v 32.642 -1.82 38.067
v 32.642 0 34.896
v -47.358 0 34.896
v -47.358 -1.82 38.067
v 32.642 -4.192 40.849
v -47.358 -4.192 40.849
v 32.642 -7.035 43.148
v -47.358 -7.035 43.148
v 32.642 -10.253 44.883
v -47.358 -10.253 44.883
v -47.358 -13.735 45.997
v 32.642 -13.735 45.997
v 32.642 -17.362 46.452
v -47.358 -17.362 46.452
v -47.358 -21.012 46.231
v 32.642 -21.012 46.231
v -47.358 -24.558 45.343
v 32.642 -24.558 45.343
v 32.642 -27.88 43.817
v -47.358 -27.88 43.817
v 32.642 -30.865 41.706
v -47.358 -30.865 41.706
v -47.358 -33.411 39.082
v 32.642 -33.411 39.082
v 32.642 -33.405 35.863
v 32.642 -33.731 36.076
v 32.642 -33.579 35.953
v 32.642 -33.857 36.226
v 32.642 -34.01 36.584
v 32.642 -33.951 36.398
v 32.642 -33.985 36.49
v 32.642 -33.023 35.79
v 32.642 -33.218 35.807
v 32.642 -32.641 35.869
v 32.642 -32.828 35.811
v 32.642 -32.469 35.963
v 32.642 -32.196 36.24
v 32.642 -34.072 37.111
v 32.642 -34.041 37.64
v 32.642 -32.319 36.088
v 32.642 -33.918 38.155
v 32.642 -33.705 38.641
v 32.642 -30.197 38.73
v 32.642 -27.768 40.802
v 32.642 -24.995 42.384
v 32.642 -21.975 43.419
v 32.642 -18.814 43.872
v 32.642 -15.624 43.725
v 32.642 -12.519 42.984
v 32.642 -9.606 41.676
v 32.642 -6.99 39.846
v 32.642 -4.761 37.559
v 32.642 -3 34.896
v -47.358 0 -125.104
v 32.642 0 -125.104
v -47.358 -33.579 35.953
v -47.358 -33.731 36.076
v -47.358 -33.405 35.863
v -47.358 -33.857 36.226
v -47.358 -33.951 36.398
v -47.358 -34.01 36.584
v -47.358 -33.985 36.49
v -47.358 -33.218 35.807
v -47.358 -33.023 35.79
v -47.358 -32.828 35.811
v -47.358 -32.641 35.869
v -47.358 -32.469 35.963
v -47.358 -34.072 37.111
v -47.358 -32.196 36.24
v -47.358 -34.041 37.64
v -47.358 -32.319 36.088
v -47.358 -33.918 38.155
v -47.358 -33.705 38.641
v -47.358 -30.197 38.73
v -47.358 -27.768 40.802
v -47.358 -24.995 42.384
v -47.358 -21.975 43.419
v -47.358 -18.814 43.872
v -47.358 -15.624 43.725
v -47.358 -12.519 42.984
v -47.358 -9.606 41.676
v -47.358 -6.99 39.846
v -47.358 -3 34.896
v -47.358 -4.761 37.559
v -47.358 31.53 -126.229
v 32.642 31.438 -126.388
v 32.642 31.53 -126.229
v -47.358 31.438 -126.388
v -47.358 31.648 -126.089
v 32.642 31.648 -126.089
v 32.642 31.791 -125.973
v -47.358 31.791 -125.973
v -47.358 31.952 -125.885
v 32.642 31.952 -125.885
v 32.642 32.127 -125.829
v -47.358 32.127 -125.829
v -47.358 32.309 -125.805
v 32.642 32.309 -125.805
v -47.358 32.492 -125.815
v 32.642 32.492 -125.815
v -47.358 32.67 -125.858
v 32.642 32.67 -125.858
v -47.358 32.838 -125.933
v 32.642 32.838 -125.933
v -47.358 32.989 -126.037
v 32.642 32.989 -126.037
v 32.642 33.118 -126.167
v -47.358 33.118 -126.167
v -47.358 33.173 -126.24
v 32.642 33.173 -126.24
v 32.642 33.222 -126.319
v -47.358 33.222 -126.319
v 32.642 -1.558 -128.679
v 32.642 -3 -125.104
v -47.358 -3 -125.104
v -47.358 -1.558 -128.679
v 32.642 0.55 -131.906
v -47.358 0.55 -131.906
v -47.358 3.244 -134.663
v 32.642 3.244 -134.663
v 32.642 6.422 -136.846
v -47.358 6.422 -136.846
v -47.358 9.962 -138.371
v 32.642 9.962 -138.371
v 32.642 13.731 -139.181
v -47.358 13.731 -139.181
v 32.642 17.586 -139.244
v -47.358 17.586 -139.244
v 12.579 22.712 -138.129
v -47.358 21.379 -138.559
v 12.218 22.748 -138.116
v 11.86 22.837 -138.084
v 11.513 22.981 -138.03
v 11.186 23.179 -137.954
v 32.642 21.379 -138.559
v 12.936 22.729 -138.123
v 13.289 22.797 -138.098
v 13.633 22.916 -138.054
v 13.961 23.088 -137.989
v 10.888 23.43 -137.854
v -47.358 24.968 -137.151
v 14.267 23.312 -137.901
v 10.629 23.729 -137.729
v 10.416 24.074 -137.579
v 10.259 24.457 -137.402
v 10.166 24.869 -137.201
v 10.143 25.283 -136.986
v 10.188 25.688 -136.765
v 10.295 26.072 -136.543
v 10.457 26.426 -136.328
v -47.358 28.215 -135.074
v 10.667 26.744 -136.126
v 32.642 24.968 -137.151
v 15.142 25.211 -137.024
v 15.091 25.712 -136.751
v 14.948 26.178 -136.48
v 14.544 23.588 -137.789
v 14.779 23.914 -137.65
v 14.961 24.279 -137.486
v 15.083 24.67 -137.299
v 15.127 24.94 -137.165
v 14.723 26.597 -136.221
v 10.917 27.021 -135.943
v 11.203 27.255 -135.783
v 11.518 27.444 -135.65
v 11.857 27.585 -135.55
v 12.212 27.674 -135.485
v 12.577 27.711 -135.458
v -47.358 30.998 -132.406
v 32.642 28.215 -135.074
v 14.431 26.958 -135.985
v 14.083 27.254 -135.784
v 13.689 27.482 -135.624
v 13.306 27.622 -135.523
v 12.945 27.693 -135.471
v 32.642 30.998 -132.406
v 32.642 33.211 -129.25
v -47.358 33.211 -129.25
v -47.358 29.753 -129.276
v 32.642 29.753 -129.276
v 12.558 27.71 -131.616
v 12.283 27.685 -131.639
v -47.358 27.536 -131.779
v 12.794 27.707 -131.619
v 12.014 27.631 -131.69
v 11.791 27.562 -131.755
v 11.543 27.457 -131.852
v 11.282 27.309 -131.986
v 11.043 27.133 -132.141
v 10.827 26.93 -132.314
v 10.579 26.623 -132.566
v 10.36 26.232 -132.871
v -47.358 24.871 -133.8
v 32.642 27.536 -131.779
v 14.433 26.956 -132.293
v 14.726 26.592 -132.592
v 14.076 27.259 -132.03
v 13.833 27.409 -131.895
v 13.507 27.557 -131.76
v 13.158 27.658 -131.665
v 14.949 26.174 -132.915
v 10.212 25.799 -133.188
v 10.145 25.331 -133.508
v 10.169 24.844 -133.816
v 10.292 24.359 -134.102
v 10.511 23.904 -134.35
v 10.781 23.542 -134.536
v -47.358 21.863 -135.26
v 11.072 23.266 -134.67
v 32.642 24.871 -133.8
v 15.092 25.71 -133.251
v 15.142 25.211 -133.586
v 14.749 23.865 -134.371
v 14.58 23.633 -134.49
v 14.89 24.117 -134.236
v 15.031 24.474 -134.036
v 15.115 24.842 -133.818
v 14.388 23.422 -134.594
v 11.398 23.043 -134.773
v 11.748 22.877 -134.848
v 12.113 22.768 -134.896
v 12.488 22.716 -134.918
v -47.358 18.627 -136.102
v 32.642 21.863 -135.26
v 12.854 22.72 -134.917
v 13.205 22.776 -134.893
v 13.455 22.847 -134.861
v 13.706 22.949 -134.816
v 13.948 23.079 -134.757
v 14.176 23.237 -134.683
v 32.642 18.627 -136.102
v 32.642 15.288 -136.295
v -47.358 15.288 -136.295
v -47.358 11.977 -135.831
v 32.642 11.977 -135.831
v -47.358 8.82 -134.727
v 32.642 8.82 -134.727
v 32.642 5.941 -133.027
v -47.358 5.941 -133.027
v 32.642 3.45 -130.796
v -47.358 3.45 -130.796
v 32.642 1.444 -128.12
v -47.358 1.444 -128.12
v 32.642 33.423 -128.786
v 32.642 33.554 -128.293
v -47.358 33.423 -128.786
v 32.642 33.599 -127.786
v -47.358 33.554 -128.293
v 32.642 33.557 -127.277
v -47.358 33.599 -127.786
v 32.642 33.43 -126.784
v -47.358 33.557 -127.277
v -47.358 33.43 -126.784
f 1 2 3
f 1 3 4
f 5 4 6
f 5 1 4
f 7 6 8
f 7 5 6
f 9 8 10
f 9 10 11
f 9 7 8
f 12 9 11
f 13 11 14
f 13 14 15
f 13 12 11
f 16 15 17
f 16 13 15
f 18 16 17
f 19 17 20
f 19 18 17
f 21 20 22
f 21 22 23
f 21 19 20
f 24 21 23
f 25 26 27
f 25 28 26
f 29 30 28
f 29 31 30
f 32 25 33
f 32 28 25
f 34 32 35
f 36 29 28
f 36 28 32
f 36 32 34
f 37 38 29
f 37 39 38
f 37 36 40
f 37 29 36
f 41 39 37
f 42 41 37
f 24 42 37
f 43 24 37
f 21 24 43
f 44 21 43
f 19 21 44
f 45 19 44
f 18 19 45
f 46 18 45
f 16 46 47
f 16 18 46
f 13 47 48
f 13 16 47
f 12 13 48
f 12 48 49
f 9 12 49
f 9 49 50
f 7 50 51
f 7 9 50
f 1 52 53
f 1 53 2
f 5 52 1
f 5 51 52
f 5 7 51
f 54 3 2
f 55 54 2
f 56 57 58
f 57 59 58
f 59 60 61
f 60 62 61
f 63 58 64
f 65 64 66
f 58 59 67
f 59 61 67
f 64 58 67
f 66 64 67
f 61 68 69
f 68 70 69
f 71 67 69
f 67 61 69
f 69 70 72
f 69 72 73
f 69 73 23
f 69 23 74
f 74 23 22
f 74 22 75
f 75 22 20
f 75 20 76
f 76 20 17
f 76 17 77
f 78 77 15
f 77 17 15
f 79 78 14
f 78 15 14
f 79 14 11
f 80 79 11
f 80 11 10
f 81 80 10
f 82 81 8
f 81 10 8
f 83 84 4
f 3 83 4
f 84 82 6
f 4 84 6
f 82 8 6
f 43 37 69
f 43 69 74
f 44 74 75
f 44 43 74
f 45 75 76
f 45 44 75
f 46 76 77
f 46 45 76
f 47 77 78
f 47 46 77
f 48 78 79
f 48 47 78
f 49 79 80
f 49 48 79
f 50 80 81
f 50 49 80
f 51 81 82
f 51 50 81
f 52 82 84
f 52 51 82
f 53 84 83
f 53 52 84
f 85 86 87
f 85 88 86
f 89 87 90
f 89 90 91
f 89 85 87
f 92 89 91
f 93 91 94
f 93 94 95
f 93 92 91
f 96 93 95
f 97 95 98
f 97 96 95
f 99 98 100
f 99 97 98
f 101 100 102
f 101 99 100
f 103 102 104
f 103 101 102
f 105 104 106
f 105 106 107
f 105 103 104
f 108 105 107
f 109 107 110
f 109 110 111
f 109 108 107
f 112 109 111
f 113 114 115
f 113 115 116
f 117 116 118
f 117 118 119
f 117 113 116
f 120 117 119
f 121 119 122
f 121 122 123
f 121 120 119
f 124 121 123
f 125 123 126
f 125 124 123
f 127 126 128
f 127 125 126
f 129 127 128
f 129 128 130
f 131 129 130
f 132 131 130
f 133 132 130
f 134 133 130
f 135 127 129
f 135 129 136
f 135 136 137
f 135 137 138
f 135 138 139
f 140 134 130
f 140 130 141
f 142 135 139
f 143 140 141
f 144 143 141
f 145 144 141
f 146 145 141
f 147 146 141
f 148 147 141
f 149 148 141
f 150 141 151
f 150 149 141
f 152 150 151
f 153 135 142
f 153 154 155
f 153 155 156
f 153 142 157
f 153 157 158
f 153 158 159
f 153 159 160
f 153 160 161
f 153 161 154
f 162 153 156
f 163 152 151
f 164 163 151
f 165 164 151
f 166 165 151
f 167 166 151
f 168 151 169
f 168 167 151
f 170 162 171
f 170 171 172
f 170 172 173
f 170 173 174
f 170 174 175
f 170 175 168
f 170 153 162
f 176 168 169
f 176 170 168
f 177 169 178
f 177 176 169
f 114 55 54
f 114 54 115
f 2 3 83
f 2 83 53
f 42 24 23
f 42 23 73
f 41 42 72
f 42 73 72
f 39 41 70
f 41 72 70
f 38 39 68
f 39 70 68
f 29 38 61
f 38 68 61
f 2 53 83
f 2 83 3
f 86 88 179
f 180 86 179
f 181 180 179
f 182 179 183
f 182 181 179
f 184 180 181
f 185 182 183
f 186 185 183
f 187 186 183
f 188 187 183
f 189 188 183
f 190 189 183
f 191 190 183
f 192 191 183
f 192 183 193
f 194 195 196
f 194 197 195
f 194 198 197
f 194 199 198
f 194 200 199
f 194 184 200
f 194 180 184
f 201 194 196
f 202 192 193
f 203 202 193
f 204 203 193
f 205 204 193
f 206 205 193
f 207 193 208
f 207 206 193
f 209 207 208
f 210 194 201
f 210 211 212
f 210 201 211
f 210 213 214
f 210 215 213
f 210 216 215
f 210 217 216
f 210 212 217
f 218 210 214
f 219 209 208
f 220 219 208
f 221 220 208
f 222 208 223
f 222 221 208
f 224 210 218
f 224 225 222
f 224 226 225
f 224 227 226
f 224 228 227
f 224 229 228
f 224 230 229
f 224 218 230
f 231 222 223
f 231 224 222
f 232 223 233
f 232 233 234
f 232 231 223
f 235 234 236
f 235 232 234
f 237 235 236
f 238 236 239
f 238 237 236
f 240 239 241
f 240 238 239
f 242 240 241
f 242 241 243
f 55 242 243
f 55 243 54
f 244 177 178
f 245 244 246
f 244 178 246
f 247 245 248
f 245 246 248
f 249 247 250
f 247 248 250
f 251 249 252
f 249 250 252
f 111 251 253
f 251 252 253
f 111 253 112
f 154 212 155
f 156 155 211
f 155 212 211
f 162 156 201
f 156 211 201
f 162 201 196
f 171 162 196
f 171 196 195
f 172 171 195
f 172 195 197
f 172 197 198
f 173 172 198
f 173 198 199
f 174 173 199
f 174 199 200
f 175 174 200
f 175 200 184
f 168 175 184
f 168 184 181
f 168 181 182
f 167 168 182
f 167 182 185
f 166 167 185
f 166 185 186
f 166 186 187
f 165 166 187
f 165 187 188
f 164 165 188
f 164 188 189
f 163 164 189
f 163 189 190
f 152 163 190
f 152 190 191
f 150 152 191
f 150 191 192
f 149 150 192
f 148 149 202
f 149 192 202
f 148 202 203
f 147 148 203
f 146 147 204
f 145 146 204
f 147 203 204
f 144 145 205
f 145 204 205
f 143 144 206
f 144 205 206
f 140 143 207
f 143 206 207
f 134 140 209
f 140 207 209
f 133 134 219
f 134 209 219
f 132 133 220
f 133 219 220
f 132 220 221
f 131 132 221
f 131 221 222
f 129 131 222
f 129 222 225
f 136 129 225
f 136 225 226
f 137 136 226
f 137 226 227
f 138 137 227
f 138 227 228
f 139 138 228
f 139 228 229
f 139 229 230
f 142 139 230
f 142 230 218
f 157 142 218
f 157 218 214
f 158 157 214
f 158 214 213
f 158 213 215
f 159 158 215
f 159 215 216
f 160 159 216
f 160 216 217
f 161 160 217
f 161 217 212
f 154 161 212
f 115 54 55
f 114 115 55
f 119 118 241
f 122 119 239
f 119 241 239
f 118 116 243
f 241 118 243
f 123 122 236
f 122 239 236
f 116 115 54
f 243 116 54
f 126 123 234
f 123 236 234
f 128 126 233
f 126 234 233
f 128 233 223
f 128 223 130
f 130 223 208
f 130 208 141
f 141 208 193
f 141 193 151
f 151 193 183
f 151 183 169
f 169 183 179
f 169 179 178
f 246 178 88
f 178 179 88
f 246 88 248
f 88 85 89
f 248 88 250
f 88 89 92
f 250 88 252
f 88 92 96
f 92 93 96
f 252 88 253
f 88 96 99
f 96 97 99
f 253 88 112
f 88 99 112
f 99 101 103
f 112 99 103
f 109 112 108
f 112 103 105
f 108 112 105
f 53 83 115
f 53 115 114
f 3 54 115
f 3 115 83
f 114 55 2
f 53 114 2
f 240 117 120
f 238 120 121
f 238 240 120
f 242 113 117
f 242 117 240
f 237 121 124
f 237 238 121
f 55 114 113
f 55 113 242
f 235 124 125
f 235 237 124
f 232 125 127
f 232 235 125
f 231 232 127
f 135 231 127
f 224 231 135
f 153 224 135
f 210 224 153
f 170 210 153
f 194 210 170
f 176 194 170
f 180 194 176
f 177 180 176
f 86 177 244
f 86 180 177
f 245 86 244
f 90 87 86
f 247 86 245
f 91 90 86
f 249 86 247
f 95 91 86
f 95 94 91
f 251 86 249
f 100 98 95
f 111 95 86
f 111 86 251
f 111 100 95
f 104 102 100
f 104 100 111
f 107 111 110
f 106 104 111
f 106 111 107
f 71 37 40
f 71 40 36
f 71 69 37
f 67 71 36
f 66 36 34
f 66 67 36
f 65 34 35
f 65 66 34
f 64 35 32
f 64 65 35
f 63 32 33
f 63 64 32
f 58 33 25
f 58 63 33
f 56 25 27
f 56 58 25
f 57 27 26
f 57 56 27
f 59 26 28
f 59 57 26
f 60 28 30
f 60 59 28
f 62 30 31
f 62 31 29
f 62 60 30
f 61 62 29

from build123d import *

# Parameters (mm, degrees)
F0_W          = 80
F0_H          = 160
F1_DEPTH      = 3
F3_DEPTH      = 80
F4_T1_DEPTH   = 104.5932134922
F4_2_T1_DEPTH = 102.506788887
F5_R          = 1
F5_2_R        = 1
F6_R          = 2.5
F7_DEPTH      = 139.3101269636


# Not quite as in the source:
# - a fillet or chamfer that OpenCascade refuses, or shapes differently, is made with other operations: its cross-section is extruded or revolved along the edge and cut away or added


with BuildPart() as f1:
    # F0 (on Front) → F1 (new body)
    with BuildSketch(Plane.XZ):
        with Locations((-7.3579295626, -45.1037270249)):
            Rectangle(F0_W, F0_H)
    extrude(amount=F1_DEPTH)


with BuildPart() as f3:
    # F2 (on face) → F3 (new body)
    with BuildSketch(Plane.YZ.offset(32.6420704374)):
        with BuildLine():
            Line((-3, 34.8962729751), (0, 34.8962729751))
            ThreePointArc((0, 34.8962729751), (-17.9972580969, 46.4620537988), (-35.9945161939, 34.8962729751))
            Line((-35.9945161939, 34.8962729751), (-32.9945161939, 34.8962729751))
            ThreePointArc((-32.9945161939, 34.8962729751), (-17.9972580969, 43.8911340273), (-3, 34.8962729751))
        make_face()
    extrude(amount=-F3_DEPTH)

    # F4: fillet of radius 3 on 1 edges, made by hand

    # F4_s2 → F4_t1 (cut)
    with BuildSketch(Plane.YZ.offset(-59.6545363087)):
        with BuildLine():
            ThreePointArc((-33.4108326759, 39.0816792247), (-34.0589945612, 36.9037991395), (-32.9945161939, 34.8962729751))
            Line((-32.9945161939, 34.8962729751), (-35.9945161939, 34.8962729751))
            ThreePointArc((-35.9945161939, 34.8962729751), (-34.8332416261, 37.0695762328), (-33.4108326759, 39.0816792247))
        make_face()
    extrude(amount=F4_T1_DEPTH, mode=Mode.SUBTRACT)

    # F5
    f5_edges = [f3.edges().sort_by_distance(p)[0] for p in [
        (-7.35793, -32.994516, 34.896273),
    ]]
    fillet(f5_edges, radius=F5_R)


with BuildPart() as f3b:
    # F2 (on face) → F3, piece 2 (new body)
    with BuildSketch(Plane.YZ.offset(32.6420704374)):
        with BuildLine():
            ThreePointArc((31.9638926898, -125.1037270249), (15.9819463449, -136.3091268636), (0, -125.1037270249))
            Line((0, -125.1037270249), (-3, -125.1037270249))
            ThreePointArc((-3, -125.1037270249), (15.9819463449, -139.3091268636), (34.9638926898, -125.1037270249))
            Line((34.9638926898, -125.1037270249), (31.9638926898, -125.1037270249))
        make_face()
    extrude(amount=-F3_DEPTH)

    # F4#2: fillet of radius 3 on 1 edges, made by hand

    # F4_2_s2 → F4_2_t1 (cut)
    with BuildSketch(Plane.YZ.offset(-58.6113240061)):
        with BuildLine():
            ThreePointArc((33.2114216404, -129.2499381943), (33.4716947989, -126.9108397557), (31.9638926898, -125.1037270249))
            Line((31.9638926898, -125.1037270249), (34.9638926898, -125.1037270249))
            ThreePointArc((34.9638926898, -125.1037270249), (34.2059560867, -127.2268337858), (33.2114216404, -129.2499381943))
        make_face()
    extrude(amount=F4_2_T1_DEPTH, mode=Mode.SUBTRACT)

    # F5#2
    f5_2_edges = [f3b.edges().sort_by_distance(p)[0] for p in [
        (-7.35793, 31.963893, -125.103727),
    ]]
    fillet(f5_2_edges, radius=F5_2_R)

    # F6 (on Top) → F7 (cut, through all)
    with BuildSketch(Plane.XY):
        with Locations((12.6420704374, 25.2114216404)):
            Circle(F6_R)
    extrude(amount=-F7_DEPTH, mode=Mode.SUBTRACT)


solid = Compound([f1.part, f3.part, f3b.part])
